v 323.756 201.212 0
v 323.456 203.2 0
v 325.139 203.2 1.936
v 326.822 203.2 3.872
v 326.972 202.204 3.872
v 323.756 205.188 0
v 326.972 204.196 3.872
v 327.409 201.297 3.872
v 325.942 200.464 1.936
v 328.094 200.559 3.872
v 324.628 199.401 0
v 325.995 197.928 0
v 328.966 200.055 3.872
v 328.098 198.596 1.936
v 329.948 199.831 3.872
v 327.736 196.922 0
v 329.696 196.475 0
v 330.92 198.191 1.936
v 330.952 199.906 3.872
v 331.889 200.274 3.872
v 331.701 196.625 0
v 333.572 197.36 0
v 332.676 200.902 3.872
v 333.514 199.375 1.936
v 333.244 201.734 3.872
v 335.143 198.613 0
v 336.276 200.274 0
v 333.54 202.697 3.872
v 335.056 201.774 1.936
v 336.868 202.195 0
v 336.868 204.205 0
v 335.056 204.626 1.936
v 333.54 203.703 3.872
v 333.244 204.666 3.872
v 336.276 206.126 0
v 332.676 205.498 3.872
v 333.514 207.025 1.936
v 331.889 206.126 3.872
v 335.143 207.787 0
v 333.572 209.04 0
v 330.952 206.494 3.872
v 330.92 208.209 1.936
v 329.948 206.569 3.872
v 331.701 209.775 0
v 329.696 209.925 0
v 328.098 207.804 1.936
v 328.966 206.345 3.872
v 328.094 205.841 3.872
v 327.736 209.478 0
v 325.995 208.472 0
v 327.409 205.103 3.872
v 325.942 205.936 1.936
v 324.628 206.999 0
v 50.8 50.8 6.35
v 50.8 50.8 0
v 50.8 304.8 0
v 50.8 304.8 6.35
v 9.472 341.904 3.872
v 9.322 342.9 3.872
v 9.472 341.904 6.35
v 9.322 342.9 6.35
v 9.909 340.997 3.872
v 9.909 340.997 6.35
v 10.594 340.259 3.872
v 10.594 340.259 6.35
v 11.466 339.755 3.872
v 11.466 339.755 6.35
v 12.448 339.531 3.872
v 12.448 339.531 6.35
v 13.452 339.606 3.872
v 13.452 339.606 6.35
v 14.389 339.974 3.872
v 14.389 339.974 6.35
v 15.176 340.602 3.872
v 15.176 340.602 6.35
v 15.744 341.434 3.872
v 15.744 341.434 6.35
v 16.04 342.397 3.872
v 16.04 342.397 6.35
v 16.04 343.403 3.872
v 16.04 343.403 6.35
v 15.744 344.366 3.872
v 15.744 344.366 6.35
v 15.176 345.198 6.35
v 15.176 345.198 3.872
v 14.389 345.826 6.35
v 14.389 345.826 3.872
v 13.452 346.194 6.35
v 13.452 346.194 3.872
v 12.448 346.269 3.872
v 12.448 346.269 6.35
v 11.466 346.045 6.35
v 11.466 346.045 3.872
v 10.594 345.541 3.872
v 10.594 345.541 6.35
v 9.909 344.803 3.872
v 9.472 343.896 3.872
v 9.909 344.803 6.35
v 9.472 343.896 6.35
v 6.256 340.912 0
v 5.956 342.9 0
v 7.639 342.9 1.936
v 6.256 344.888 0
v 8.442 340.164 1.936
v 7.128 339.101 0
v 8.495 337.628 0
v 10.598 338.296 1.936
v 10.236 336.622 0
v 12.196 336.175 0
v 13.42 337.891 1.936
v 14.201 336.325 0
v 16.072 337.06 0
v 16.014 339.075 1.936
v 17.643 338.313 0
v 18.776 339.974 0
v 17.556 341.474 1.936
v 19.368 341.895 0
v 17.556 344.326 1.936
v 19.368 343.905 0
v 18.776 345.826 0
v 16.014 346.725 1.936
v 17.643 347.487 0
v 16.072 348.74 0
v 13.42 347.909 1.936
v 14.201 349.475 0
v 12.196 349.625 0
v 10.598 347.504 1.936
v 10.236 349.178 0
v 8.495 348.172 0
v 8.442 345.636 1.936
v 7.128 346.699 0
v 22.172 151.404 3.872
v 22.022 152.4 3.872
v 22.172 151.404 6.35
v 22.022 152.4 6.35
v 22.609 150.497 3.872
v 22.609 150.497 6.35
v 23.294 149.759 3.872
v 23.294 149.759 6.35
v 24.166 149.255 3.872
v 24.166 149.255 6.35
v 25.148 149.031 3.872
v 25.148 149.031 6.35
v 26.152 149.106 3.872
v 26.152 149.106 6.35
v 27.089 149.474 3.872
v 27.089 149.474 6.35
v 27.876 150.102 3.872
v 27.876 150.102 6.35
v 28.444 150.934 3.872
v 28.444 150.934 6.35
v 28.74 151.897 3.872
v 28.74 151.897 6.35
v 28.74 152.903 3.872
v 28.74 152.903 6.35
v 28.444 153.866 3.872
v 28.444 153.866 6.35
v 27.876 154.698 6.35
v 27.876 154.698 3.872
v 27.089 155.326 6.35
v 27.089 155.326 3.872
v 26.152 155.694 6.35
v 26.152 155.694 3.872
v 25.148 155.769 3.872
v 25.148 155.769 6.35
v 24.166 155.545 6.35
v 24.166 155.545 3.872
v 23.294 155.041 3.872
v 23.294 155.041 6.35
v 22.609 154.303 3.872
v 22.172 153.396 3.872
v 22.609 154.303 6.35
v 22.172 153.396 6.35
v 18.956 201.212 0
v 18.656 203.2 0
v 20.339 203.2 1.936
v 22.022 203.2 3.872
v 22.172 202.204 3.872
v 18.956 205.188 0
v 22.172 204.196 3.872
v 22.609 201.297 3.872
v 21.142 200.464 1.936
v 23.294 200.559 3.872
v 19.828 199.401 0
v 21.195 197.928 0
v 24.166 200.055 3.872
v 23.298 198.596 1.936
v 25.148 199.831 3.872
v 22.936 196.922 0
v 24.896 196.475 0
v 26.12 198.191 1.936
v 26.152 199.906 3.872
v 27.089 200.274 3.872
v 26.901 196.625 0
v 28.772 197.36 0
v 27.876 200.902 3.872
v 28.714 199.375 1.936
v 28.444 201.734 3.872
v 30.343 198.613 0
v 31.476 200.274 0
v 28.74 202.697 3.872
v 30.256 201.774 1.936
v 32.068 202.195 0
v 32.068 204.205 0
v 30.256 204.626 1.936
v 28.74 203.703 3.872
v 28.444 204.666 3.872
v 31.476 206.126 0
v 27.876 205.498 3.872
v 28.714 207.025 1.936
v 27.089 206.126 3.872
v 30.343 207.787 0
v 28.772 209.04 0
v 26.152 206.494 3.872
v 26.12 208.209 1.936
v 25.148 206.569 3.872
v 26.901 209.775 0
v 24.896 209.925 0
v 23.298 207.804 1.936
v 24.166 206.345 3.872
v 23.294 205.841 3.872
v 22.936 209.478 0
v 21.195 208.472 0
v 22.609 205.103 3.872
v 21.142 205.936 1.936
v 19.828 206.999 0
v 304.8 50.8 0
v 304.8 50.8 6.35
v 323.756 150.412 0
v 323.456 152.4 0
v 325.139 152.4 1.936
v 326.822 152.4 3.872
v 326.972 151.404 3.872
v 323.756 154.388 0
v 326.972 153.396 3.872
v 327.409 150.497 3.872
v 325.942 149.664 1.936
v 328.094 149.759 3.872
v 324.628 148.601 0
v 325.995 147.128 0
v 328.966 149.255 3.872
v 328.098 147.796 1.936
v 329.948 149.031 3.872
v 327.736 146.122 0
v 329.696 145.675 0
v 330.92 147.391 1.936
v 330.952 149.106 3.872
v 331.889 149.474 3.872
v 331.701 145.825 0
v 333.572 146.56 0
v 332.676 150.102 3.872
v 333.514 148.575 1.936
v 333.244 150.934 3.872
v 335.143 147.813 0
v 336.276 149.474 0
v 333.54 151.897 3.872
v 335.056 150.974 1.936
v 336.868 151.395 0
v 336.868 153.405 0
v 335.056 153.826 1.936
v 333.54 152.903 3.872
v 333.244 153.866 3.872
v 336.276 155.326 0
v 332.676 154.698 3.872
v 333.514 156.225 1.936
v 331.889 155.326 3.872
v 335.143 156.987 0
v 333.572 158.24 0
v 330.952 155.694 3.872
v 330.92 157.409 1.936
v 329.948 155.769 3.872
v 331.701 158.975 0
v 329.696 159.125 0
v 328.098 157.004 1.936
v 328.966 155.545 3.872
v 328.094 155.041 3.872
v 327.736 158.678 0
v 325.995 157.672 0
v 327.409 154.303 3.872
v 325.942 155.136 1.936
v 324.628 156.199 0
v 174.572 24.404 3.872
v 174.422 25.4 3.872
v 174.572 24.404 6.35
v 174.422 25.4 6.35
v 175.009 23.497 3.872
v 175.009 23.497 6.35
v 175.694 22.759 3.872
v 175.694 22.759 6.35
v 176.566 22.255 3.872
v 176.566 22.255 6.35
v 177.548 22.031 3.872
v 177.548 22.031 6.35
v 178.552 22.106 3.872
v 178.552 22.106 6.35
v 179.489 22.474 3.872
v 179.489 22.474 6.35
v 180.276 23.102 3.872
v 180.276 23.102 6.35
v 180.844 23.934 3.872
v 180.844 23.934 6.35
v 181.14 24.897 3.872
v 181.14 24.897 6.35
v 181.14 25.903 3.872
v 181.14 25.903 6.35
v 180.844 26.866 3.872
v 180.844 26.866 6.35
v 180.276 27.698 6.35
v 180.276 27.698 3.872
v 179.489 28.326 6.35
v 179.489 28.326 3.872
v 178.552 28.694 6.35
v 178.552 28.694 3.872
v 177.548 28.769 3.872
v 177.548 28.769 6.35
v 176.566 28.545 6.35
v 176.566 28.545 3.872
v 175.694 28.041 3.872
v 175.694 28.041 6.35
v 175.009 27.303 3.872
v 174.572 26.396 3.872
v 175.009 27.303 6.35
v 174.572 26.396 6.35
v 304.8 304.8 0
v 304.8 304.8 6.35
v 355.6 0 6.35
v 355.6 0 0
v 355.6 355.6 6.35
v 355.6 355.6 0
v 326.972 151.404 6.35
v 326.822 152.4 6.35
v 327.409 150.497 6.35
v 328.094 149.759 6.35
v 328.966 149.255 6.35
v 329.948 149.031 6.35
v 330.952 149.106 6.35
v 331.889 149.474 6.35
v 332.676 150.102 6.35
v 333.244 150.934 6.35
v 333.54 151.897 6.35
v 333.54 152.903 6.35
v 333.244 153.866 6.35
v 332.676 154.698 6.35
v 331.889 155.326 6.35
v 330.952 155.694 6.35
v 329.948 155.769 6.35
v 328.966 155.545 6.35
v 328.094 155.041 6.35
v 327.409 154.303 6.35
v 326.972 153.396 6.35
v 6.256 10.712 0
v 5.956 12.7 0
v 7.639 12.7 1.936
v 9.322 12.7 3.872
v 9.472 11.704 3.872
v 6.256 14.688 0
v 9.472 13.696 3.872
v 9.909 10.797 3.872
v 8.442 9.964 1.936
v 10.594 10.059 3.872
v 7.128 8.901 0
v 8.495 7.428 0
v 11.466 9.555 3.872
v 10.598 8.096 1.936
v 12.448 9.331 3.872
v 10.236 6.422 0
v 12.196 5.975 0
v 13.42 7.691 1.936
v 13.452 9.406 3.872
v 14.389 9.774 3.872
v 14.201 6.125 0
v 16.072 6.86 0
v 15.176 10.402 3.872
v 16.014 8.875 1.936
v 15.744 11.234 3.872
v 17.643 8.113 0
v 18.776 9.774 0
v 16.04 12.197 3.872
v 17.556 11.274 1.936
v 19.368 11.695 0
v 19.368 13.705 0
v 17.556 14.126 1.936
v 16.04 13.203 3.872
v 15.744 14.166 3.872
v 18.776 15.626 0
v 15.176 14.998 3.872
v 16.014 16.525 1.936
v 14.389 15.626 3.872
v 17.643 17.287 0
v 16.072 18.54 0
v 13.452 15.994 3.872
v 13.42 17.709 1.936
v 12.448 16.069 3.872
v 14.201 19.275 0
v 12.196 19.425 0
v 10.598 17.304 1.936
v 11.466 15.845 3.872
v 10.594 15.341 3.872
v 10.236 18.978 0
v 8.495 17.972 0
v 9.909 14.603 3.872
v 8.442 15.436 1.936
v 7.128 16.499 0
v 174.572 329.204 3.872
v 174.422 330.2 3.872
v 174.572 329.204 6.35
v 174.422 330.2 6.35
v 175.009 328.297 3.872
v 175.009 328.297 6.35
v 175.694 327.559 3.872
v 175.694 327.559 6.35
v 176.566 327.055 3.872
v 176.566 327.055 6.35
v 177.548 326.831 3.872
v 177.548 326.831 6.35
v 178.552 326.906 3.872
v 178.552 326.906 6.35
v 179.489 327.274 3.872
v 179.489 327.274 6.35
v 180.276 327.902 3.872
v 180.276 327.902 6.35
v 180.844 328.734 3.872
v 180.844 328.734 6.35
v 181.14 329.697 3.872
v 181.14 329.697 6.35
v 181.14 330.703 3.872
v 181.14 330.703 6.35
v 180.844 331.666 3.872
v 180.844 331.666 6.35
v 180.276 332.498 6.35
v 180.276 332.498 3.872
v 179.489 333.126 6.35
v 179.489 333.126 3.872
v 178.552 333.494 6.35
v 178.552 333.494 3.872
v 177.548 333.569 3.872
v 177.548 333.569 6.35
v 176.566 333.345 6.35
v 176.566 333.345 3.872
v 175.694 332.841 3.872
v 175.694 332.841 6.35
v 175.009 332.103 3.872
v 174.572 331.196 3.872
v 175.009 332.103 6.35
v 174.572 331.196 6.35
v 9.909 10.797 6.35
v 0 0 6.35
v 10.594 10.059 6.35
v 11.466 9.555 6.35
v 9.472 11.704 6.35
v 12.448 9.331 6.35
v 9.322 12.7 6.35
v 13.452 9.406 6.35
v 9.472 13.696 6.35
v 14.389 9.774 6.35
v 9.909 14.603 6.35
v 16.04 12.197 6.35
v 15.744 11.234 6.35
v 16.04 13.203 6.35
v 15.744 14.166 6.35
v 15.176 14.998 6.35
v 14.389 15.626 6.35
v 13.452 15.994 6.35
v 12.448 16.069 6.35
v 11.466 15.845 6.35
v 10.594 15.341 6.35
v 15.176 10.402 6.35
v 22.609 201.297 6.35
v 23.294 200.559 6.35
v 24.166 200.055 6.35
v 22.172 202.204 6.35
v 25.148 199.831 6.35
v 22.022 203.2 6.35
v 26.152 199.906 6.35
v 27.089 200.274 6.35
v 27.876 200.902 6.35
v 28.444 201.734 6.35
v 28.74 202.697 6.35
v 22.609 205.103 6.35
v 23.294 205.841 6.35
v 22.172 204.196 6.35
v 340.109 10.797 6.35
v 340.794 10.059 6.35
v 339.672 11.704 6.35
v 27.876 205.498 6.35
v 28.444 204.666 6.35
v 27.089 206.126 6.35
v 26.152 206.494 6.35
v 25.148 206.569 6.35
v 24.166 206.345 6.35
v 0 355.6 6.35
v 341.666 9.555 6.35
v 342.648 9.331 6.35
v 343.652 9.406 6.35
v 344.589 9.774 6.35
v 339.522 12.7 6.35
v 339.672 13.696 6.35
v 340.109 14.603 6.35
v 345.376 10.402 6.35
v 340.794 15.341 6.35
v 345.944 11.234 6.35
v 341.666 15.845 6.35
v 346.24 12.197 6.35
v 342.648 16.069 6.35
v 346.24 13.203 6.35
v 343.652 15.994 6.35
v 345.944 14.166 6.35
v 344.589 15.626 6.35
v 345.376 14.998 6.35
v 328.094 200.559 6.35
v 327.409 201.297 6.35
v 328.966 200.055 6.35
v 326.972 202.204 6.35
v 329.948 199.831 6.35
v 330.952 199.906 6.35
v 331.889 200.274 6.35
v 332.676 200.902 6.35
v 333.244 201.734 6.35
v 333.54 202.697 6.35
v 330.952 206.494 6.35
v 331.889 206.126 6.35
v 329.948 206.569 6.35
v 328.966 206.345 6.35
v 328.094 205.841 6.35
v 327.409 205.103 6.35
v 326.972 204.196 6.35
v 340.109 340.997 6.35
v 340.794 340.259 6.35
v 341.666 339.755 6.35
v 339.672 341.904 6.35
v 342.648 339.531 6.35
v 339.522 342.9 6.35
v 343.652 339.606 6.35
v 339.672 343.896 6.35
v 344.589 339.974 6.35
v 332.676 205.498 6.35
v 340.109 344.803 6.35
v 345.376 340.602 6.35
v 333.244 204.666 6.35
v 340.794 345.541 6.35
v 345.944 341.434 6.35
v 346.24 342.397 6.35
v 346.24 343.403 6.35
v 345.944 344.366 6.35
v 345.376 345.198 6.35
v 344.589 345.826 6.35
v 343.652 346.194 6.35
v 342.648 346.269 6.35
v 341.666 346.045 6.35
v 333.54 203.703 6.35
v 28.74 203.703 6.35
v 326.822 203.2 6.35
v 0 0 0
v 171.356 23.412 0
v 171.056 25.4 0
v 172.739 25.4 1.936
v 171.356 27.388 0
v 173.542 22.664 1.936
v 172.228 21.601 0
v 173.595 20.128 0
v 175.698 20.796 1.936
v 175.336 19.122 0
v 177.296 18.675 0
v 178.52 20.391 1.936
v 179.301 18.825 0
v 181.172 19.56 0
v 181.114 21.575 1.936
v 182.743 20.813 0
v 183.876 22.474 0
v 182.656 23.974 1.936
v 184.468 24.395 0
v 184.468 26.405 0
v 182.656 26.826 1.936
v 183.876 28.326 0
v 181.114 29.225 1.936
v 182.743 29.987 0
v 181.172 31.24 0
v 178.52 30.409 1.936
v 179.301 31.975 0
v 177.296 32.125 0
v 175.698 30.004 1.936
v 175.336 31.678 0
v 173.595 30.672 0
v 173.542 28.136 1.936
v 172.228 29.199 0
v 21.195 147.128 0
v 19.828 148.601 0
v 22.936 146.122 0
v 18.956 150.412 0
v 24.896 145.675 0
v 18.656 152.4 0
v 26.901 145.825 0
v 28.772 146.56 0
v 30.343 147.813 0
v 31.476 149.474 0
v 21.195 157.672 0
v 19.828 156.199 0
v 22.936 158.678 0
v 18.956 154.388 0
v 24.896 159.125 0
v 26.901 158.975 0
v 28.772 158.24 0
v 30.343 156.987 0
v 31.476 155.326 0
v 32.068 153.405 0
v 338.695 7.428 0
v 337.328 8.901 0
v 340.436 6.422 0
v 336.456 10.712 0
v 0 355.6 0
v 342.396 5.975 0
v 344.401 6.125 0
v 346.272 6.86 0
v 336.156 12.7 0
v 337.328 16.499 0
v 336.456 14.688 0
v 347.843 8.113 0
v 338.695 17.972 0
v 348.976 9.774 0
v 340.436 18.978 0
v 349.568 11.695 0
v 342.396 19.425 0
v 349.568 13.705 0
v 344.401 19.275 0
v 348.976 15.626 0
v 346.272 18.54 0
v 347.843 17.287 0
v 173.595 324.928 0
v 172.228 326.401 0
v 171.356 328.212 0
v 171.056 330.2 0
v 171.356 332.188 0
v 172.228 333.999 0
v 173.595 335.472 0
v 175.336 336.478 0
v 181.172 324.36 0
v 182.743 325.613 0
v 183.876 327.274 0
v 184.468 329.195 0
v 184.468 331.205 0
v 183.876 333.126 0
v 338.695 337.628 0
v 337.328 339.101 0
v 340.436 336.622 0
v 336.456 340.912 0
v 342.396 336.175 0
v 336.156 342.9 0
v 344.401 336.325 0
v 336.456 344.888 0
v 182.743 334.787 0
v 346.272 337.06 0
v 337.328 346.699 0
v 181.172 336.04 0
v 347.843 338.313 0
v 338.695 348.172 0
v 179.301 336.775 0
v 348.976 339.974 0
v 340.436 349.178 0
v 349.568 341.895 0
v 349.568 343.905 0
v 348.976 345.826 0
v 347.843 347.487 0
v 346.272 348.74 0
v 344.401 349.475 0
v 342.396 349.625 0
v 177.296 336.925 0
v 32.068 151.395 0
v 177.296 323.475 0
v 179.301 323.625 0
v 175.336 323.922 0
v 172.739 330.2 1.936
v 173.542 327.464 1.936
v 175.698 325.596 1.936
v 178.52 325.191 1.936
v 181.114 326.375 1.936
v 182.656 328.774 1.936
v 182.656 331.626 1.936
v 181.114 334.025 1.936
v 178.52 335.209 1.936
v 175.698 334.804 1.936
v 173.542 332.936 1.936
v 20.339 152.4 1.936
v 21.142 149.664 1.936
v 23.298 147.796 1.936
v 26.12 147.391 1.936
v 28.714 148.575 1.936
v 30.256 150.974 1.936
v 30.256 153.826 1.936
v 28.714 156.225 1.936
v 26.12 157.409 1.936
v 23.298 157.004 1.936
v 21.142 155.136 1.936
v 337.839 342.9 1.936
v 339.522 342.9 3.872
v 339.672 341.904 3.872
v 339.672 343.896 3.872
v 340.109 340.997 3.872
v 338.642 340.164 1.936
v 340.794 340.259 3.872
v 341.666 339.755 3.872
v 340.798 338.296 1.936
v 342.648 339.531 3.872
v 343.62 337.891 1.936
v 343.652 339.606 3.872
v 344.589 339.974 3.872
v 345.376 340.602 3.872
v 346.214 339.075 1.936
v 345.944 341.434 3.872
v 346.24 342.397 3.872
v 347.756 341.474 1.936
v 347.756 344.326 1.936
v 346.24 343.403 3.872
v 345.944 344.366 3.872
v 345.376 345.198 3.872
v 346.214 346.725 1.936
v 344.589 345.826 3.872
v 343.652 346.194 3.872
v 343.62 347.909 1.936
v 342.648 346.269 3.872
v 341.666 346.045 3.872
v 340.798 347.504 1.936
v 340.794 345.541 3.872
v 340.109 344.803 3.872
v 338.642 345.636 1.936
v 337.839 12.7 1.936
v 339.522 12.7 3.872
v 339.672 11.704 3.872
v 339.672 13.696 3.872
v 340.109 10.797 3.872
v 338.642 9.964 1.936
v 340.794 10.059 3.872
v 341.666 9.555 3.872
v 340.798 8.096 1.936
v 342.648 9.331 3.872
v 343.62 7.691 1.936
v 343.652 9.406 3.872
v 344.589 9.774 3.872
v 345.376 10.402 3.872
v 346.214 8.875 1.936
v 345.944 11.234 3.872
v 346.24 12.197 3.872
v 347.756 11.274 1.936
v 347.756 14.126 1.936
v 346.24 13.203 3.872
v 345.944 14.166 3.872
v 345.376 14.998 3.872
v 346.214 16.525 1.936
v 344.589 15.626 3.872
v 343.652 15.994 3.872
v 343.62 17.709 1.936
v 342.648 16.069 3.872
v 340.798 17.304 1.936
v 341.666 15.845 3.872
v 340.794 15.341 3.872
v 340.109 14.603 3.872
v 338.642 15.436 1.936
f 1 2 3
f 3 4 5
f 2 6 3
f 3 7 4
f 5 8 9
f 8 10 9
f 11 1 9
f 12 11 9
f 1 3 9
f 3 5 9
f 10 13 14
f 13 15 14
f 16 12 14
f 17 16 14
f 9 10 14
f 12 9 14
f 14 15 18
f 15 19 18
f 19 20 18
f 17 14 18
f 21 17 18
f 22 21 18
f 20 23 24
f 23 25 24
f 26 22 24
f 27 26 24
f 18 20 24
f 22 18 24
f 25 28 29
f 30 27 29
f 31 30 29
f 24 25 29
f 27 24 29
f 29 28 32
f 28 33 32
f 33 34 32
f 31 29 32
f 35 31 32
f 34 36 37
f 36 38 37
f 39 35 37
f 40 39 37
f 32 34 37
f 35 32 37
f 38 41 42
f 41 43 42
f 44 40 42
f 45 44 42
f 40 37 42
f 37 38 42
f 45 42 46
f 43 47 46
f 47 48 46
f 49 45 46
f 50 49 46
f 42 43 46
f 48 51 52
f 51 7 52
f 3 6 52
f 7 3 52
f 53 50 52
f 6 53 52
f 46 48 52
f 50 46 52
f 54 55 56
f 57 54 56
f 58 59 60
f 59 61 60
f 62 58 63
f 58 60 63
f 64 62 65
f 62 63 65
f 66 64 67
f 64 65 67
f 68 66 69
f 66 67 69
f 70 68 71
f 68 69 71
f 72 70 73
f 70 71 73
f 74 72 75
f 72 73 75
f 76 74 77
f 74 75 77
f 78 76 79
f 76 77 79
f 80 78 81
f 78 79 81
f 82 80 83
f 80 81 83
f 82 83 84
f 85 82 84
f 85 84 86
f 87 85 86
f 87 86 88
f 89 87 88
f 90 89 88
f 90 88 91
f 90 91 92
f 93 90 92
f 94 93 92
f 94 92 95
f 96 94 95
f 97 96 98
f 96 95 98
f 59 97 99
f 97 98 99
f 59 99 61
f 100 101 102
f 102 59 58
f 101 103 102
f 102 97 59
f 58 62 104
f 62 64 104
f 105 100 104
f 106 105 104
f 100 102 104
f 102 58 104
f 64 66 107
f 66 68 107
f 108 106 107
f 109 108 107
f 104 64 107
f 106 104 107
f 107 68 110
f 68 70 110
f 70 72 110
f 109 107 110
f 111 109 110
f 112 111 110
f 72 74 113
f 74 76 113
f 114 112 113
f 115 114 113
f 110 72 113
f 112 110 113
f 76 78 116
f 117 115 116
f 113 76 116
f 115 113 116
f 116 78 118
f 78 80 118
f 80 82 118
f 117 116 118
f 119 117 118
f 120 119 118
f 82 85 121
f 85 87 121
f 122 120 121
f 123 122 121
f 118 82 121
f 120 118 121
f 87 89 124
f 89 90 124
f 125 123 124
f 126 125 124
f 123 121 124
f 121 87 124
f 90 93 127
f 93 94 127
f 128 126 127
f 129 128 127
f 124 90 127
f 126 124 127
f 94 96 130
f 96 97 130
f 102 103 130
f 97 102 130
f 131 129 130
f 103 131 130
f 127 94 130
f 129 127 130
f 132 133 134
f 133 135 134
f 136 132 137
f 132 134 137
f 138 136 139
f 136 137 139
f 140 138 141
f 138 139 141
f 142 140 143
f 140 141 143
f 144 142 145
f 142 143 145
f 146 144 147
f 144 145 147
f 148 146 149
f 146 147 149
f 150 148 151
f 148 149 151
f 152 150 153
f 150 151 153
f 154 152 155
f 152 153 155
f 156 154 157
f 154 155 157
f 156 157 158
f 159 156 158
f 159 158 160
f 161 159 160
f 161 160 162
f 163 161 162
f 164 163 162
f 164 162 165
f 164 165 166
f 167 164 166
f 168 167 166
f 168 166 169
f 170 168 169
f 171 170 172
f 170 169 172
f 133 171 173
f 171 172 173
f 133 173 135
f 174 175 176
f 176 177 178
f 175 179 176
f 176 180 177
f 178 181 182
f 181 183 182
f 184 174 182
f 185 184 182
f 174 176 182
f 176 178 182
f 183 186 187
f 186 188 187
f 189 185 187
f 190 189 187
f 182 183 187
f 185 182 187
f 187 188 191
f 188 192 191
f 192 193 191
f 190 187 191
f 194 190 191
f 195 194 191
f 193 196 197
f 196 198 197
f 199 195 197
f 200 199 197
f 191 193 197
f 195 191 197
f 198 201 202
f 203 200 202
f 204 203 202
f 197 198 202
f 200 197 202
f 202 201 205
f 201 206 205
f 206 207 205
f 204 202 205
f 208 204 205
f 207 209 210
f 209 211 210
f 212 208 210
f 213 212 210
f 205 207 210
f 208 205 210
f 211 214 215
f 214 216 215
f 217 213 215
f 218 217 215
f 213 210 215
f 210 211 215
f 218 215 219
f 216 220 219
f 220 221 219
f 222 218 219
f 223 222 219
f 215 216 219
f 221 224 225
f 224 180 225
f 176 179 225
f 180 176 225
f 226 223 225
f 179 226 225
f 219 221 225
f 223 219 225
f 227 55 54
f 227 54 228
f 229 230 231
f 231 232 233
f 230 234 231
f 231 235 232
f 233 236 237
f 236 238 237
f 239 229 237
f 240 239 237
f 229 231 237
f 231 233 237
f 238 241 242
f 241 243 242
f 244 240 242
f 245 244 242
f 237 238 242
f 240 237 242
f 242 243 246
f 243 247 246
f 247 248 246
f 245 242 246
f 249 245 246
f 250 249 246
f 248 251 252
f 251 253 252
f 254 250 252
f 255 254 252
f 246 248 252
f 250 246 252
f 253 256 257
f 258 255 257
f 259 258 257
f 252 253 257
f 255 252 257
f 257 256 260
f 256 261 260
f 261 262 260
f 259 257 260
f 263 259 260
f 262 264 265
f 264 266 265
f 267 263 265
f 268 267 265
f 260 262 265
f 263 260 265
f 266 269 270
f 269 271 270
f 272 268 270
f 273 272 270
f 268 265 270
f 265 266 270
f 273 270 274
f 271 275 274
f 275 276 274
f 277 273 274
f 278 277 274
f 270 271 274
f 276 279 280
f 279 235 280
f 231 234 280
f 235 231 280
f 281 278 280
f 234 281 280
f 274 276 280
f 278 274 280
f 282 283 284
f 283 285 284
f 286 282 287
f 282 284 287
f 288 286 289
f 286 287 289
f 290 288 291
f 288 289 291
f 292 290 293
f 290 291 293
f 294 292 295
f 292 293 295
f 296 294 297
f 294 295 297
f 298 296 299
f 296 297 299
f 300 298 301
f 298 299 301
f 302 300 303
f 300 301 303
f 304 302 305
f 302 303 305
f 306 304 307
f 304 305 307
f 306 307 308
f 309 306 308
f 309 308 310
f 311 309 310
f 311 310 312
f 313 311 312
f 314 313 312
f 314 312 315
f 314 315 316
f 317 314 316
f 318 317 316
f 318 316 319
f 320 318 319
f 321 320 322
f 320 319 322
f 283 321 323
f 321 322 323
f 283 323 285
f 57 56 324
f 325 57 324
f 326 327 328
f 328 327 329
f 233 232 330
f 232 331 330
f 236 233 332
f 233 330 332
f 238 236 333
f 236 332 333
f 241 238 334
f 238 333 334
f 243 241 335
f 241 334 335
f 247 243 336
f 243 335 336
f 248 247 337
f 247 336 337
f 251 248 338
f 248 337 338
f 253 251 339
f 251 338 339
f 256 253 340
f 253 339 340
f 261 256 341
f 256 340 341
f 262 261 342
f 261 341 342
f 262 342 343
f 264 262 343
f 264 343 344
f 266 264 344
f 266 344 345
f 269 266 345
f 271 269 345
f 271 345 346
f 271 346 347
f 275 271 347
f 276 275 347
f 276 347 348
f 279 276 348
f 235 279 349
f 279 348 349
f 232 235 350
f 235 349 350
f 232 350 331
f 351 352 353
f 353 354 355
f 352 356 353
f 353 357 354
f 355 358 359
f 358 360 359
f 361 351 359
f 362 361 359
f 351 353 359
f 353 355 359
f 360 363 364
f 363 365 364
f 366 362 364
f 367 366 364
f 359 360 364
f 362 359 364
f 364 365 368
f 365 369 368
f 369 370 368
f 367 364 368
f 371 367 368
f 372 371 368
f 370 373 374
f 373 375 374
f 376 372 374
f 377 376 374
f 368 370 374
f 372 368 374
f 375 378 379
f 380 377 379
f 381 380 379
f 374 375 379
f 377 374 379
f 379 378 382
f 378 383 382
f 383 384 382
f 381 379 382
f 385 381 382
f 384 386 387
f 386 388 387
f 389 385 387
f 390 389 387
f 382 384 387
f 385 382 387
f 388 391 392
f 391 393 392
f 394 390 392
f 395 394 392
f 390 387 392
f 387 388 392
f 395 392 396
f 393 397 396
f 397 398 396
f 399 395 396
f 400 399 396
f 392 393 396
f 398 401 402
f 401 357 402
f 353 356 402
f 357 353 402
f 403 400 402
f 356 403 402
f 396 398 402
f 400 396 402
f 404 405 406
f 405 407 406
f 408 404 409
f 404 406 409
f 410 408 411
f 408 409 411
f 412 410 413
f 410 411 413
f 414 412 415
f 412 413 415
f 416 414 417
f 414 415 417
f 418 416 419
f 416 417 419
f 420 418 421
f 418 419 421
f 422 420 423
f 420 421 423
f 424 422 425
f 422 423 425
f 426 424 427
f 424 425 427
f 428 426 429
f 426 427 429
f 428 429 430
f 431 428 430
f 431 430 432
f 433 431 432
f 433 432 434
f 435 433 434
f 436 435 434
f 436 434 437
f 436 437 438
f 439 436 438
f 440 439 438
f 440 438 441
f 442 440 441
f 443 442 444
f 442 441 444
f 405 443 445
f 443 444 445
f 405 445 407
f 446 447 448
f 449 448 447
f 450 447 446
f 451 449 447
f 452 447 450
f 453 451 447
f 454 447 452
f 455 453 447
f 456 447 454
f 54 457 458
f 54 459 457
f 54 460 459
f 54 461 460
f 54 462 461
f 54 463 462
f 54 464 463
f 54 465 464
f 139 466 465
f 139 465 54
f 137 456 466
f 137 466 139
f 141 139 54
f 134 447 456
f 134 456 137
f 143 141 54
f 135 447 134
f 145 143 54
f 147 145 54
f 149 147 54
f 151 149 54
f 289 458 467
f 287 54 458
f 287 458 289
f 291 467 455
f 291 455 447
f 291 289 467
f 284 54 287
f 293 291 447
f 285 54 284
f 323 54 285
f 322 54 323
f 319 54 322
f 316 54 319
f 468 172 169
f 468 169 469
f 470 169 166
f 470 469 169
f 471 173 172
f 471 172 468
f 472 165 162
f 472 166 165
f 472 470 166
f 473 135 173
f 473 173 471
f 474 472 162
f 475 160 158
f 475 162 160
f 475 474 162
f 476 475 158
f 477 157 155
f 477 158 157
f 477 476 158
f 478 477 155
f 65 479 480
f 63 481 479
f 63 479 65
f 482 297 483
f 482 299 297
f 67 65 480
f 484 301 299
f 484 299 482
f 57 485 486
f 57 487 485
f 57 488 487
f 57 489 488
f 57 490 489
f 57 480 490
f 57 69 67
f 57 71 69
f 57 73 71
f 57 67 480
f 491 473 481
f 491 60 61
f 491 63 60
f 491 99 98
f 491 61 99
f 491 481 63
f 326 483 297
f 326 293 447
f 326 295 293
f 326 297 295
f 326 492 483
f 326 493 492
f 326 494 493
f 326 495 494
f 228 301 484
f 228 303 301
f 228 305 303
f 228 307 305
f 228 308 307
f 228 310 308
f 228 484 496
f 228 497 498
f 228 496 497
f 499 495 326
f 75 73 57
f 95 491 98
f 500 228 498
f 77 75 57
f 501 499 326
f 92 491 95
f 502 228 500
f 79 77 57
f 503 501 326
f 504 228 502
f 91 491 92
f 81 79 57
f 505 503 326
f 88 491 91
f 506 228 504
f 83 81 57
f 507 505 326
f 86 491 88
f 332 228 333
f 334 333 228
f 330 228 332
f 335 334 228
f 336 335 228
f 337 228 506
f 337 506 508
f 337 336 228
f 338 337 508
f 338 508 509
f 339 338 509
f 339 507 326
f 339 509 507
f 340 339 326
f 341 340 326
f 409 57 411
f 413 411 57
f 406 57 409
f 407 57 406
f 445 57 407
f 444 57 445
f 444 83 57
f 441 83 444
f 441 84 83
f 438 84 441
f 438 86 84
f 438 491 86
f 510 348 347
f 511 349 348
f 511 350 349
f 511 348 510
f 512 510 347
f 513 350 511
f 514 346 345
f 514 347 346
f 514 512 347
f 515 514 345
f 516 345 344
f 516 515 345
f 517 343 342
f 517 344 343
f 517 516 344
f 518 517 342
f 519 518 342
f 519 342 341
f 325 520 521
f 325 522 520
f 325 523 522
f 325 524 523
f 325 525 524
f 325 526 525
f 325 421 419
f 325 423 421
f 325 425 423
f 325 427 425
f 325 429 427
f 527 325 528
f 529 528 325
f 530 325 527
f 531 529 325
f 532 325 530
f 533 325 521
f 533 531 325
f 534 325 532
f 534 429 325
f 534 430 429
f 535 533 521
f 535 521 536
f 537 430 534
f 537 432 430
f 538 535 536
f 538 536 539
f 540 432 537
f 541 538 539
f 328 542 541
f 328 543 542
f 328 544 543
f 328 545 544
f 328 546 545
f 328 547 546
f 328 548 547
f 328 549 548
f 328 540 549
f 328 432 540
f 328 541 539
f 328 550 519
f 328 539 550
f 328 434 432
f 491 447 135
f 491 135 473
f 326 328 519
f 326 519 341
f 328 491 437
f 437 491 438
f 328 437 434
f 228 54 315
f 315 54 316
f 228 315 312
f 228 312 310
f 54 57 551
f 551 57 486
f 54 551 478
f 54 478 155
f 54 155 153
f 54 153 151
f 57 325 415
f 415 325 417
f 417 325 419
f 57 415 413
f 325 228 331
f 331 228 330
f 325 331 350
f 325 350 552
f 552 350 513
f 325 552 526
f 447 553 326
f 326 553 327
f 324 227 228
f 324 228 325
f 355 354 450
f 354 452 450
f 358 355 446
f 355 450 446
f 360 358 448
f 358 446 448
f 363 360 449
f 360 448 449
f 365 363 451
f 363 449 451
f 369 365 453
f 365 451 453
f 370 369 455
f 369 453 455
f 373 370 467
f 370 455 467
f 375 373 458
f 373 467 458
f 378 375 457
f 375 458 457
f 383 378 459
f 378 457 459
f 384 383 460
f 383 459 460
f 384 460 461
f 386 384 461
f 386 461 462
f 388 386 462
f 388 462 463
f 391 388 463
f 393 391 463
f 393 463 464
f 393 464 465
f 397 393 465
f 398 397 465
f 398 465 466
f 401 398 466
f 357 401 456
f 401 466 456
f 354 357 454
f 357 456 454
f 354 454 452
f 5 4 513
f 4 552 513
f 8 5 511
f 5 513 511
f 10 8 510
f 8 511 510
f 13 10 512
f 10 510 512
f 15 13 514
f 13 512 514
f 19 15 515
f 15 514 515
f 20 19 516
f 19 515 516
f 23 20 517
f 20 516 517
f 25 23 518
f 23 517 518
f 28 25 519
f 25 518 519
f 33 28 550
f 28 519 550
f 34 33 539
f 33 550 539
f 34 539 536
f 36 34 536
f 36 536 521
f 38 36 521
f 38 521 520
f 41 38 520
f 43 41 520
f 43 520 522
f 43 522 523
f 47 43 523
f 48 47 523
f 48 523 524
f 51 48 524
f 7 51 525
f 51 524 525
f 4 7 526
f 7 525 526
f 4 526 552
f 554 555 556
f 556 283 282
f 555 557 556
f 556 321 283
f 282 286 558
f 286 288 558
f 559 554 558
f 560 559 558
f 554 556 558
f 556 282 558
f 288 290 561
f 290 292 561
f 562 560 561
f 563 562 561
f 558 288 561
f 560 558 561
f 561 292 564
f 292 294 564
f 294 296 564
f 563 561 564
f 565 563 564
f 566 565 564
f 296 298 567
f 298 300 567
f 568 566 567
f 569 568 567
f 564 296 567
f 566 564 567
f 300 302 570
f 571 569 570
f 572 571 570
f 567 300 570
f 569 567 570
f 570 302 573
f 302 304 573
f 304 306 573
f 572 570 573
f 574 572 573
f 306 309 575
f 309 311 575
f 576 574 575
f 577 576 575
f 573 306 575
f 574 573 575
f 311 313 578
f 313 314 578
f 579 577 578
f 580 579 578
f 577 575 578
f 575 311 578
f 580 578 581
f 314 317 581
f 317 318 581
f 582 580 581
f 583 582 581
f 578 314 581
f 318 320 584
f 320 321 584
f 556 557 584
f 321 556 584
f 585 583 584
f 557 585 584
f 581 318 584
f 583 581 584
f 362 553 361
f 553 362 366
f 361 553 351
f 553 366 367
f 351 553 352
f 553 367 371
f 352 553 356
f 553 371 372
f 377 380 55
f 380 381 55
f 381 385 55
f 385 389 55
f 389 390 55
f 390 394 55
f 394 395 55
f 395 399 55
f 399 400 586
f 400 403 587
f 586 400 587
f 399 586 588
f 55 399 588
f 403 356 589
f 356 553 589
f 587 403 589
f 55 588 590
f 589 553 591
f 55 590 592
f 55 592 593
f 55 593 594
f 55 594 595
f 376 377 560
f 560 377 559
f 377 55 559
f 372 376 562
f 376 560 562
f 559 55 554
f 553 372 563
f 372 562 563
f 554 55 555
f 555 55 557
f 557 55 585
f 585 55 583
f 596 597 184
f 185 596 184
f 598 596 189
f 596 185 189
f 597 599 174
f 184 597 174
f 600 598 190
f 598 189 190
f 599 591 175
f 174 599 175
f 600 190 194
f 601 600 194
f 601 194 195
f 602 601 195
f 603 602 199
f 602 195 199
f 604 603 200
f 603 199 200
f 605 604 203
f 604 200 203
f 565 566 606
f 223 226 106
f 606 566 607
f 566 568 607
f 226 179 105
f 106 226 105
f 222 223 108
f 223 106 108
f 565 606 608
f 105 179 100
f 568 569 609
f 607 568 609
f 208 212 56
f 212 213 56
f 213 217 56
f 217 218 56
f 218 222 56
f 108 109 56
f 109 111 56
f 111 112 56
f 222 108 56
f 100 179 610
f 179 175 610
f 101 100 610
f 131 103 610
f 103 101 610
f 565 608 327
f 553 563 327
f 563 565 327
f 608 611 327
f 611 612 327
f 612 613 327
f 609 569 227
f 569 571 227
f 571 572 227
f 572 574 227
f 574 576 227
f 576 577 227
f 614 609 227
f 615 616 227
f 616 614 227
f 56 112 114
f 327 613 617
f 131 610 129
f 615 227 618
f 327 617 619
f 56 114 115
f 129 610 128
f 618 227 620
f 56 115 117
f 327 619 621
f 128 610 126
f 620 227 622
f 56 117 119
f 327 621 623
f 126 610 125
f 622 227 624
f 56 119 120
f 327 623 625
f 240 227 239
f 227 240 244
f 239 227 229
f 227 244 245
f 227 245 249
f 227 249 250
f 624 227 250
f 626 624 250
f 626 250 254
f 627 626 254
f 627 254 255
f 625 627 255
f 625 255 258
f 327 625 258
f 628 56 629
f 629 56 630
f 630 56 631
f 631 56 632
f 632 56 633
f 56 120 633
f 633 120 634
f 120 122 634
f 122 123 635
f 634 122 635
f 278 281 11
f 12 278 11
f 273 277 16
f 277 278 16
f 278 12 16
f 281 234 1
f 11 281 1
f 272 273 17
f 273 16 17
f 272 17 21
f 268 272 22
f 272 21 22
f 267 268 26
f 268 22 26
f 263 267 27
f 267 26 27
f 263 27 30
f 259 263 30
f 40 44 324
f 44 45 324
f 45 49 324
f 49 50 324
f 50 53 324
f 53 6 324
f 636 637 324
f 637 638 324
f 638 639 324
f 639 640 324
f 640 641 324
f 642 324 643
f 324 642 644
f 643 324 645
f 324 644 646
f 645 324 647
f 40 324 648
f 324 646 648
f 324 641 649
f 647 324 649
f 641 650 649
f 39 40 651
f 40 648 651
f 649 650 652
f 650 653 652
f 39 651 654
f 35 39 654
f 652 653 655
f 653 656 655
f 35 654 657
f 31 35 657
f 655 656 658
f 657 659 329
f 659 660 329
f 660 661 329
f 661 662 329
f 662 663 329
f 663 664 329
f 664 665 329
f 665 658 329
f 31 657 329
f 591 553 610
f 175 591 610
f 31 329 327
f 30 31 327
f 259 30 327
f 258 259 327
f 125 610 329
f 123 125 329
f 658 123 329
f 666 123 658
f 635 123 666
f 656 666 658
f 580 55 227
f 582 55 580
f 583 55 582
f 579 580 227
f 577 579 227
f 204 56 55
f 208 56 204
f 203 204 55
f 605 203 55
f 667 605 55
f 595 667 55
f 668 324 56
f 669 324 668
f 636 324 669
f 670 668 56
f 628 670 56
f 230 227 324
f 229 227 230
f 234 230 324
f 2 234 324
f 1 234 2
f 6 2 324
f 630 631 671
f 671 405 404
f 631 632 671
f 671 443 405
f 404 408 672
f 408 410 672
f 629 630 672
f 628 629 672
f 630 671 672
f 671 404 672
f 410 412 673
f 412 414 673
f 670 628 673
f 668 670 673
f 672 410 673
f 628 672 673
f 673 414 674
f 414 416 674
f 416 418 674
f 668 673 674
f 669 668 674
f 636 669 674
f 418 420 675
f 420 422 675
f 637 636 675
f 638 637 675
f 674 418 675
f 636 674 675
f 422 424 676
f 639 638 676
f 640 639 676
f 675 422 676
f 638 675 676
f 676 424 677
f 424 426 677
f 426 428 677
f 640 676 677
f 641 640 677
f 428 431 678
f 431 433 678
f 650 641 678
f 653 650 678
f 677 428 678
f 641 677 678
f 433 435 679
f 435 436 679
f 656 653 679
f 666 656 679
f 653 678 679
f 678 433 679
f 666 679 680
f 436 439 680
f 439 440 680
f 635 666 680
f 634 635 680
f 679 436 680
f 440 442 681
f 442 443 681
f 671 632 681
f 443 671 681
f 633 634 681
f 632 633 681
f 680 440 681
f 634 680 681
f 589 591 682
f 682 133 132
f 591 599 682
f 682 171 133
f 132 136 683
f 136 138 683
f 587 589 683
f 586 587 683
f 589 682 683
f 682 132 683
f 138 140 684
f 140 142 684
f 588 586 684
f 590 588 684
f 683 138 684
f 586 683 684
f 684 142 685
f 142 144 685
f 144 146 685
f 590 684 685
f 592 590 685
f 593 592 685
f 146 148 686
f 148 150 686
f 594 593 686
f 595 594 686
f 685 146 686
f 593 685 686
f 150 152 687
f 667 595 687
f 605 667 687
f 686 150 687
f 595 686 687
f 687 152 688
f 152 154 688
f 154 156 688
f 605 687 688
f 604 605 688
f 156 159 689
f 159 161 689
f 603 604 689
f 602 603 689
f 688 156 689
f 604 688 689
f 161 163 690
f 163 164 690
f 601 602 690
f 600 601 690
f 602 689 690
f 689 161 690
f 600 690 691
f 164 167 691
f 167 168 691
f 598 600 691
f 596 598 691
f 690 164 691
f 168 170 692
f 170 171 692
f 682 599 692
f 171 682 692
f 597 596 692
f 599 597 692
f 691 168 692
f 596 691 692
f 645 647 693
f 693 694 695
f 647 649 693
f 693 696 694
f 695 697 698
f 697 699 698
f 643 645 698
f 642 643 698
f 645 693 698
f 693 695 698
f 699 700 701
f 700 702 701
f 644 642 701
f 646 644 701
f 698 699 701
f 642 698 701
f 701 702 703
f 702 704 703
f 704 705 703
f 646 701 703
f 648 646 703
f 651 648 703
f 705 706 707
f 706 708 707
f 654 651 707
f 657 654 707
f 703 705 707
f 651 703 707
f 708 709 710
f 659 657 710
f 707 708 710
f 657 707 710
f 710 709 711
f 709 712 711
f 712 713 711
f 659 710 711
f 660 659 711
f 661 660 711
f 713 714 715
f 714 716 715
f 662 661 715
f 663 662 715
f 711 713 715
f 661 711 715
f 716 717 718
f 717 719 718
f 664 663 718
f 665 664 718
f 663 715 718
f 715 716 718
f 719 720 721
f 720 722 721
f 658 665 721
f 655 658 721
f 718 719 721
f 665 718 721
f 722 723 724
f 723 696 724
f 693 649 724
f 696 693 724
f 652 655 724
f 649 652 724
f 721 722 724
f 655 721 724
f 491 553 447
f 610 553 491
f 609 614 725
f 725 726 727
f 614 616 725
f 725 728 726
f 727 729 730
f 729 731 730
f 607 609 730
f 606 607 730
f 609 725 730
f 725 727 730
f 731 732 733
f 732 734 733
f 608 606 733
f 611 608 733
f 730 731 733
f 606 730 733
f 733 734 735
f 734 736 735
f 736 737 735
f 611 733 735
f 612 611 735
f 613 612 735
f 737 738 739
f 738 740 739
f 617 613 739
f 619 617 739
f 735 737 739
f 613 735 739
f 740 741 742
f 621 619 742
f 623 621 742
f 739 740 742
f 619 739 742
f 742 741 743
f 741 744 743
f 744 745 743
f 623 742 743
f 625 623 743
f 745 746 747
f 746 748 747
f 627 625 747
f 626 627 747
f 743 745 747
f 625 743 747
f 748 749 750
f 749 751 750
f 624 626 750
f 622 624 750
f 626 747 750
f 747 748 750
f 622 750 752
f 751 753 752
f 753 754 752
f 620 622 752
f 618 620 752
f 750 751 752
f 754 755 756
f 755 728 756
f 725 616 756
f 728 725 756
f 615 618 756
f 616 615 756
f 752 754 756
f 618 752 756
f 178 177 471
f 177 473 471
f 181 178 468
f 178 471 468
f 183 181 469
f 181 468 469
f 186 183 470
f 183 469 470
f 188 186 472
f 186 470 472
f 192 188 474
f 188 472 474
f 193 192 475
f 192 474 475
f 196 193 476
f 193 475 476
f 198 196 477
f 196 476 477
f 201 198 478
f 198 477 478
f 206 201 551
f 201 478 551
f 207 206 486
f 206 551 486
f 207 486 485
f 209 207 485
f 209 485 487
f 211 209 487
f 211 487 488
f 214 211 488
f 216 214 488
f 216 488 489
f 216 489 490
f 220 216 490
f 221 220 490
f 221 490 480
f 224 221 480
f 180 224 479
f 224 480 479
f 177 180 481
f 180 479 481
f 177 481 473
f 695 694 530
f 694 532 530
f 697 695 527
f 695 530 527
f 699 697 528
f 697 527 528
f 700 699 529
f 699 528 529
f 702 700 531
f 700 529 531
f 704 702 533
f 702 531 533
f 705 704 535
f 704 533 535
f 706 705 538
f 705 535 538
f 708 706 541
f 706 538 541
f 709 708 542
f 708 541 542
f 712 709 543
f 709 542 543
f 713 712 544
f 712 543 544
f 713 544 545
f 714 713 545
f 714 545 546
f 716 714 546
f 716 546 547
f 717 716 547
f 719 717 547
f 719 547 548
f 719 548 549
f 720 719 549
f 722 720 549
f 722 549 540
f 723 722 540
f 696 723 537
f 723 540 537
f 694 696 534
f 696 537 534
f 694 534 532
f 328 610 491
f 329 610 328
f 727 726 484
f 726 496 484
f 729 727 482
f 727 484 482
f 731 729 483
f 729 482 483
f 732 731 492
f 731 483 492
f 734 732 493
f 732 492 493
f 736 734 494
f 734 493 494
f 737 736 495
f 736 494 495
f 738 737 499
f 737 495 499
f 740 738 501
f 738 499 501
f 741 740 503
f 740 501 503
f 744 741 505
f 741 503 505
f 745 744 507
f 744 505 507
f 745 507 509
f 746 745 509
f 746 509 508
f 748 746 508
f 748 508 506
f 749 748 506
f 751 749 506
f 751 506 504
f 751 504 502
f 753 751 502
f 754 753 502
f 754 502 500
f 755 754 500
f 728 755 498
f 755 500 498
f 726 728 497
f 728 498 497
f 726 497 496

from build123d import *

# Parameters (mm, degrees)
F0_W           = 355.6
F0_H           = 355.6
F0_W_2         = 254
F0_H_2         = 254
F1_DEPTH       = 6.35
F2_D           = 6.7564
F2_DEPTH       = 26.0604
F2_CSINK_D     = 13.4874
F2_CSINK_ANGLE = 82
F2_TIP         = 2.0298273432


# Not quite as in the source:
# - a feature names something its author has since deleted; it is built from what else it names


with BuildPart() as f1:
    # F0 (on Top) → F1 (new body)
    with BuildSketch(Plane.XY):
        with Locations((177.8, 177.8)):
            Rectangle(F0_W, F0_H)
        with Locations((177.8, 177.8)):
            Rectangle(F0_W_2, F0_H_2, mode=Mode.SUBTRACT)
    extrude(amount=F1_DEPTH)

    # F2
    with Locations(Plane(origin=(0, 0, 0), x_dir=(1, 0, 0), z_dir=(0, 0, -1))):
        with Locations((12.7, -342.9), (342.9, -342.9), (342.9, -12.7), (12.7, -12.7), (177.8, -25.4), (177.8, -330.2), (25.4, -152.4), (330.2, -203.2), (330.2, -152.4), (25.4, -203.2)):
            CounterSinkHole(F2_D / 2, F2_CSINK_D / 2, depth=F2_DEPTH, counter_sink_angle=F2_CSINK_ANGLE)
            with Locations((0, 0, -(F2_DEPTH + F2_TIP / 2))):  # 118° drill point
                Cone(0, F2_D / 2, F2_TIP, mode=Mode.SUBTRACT)


solid = f1.part
